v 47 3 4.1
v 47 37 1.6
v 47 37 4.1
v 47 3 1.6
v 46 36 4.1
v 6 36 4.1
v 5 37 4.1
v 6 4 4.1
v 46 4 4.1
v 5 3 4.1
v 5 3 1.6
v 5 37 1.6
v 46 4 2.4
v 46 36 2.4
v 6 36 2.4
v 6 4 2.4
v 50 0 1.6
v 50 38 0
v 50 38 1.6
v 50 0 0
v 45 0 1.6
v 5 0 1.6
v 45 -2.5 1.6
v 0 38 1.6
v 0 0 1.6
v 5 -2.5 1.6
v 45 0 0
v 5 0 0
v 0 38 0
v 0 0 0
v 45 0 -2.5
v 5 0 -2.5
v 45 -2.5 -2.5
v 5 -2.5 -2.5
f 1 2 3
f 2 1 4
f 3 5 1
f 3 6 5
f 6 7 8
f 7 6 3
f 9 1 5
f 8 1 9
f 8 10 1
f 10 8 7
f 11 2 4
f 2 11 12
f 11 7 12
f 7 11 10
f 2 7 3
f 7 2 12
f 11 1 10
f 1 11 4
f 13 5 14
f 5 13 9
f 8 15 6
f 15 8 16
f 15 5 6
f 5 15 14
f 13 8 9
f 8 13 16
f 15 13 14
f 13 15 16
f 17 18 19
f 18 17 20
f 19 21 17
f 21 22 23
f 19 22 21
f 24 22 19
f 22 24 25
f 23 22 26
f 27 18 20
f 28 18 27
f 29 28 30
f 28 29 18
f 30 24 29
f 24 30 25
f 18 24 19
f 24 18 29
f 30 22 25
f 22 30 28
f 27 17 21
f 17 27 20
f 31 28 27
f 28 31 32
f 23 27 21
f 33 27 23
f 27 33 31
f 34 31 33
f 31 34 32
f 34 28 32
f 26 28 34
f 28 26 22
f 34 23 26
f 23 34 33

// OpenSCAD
// =============================================================================
// ILI9225 2.0" TFT Display - Reference Model
// For fitment verification only - not for printing
// Dimensions are estimates - actual module may vary
// =============================================================================

// Include parameters (safe to include multiple times)
include <../parameters.scad>

// Typical ILI9225 module dimensions (may vary by manufacturer)
display_module_width = 50;    // PCB width
display_module_height = 38;   // PCB height
display_module_pcb_thick = 1.6;

// Active display area
display_active_width = 40;    // Visible screen width (landscape)
display_active_height = 32;   // Visible screen height
display_glass_thick = 2.5;    // Glass + components above PCB

// Backlight/driver board below
display_back_thick = 2.0;

module ili9225_display() {
    // PCB
    color(color_pcb)
    cube([display_module_width, display_module_height, display_module_pcb_thick]);

    // Display assembly on top
    translate([(display_module_width - display_active_width) / 2,
               (display_module_height - display_active_height) / 2,
               display_module_pcb_thick]) {

        // Metal frame around display
        color([0.7, 0.7, 0.7])
        difference() {
            cube([display_active_width + 2, display_active_height + 2, display_glass_thick]);
            translate([1, 1, 0.5])
                cube([display_active_width, display_active_height, display_glass_thick]);
        }

        // Display glass (dark when off)
        translate([1, 1, 0.3])
        color([0.1, 0.1, 0.12])
            cube([display_active_width, display_active_height, 0.5]);
    }

    // Header pins (bottom edge, typical)
    color([0.2, 0.2, 0.2])
    translate([5, -2.5, -2.5])
        cube([display_module_width - 10, 2.5, 2.5 + display_module_pcb_thick]);
}

// Preview (renders when opening this file directly)
ili9225_display();
